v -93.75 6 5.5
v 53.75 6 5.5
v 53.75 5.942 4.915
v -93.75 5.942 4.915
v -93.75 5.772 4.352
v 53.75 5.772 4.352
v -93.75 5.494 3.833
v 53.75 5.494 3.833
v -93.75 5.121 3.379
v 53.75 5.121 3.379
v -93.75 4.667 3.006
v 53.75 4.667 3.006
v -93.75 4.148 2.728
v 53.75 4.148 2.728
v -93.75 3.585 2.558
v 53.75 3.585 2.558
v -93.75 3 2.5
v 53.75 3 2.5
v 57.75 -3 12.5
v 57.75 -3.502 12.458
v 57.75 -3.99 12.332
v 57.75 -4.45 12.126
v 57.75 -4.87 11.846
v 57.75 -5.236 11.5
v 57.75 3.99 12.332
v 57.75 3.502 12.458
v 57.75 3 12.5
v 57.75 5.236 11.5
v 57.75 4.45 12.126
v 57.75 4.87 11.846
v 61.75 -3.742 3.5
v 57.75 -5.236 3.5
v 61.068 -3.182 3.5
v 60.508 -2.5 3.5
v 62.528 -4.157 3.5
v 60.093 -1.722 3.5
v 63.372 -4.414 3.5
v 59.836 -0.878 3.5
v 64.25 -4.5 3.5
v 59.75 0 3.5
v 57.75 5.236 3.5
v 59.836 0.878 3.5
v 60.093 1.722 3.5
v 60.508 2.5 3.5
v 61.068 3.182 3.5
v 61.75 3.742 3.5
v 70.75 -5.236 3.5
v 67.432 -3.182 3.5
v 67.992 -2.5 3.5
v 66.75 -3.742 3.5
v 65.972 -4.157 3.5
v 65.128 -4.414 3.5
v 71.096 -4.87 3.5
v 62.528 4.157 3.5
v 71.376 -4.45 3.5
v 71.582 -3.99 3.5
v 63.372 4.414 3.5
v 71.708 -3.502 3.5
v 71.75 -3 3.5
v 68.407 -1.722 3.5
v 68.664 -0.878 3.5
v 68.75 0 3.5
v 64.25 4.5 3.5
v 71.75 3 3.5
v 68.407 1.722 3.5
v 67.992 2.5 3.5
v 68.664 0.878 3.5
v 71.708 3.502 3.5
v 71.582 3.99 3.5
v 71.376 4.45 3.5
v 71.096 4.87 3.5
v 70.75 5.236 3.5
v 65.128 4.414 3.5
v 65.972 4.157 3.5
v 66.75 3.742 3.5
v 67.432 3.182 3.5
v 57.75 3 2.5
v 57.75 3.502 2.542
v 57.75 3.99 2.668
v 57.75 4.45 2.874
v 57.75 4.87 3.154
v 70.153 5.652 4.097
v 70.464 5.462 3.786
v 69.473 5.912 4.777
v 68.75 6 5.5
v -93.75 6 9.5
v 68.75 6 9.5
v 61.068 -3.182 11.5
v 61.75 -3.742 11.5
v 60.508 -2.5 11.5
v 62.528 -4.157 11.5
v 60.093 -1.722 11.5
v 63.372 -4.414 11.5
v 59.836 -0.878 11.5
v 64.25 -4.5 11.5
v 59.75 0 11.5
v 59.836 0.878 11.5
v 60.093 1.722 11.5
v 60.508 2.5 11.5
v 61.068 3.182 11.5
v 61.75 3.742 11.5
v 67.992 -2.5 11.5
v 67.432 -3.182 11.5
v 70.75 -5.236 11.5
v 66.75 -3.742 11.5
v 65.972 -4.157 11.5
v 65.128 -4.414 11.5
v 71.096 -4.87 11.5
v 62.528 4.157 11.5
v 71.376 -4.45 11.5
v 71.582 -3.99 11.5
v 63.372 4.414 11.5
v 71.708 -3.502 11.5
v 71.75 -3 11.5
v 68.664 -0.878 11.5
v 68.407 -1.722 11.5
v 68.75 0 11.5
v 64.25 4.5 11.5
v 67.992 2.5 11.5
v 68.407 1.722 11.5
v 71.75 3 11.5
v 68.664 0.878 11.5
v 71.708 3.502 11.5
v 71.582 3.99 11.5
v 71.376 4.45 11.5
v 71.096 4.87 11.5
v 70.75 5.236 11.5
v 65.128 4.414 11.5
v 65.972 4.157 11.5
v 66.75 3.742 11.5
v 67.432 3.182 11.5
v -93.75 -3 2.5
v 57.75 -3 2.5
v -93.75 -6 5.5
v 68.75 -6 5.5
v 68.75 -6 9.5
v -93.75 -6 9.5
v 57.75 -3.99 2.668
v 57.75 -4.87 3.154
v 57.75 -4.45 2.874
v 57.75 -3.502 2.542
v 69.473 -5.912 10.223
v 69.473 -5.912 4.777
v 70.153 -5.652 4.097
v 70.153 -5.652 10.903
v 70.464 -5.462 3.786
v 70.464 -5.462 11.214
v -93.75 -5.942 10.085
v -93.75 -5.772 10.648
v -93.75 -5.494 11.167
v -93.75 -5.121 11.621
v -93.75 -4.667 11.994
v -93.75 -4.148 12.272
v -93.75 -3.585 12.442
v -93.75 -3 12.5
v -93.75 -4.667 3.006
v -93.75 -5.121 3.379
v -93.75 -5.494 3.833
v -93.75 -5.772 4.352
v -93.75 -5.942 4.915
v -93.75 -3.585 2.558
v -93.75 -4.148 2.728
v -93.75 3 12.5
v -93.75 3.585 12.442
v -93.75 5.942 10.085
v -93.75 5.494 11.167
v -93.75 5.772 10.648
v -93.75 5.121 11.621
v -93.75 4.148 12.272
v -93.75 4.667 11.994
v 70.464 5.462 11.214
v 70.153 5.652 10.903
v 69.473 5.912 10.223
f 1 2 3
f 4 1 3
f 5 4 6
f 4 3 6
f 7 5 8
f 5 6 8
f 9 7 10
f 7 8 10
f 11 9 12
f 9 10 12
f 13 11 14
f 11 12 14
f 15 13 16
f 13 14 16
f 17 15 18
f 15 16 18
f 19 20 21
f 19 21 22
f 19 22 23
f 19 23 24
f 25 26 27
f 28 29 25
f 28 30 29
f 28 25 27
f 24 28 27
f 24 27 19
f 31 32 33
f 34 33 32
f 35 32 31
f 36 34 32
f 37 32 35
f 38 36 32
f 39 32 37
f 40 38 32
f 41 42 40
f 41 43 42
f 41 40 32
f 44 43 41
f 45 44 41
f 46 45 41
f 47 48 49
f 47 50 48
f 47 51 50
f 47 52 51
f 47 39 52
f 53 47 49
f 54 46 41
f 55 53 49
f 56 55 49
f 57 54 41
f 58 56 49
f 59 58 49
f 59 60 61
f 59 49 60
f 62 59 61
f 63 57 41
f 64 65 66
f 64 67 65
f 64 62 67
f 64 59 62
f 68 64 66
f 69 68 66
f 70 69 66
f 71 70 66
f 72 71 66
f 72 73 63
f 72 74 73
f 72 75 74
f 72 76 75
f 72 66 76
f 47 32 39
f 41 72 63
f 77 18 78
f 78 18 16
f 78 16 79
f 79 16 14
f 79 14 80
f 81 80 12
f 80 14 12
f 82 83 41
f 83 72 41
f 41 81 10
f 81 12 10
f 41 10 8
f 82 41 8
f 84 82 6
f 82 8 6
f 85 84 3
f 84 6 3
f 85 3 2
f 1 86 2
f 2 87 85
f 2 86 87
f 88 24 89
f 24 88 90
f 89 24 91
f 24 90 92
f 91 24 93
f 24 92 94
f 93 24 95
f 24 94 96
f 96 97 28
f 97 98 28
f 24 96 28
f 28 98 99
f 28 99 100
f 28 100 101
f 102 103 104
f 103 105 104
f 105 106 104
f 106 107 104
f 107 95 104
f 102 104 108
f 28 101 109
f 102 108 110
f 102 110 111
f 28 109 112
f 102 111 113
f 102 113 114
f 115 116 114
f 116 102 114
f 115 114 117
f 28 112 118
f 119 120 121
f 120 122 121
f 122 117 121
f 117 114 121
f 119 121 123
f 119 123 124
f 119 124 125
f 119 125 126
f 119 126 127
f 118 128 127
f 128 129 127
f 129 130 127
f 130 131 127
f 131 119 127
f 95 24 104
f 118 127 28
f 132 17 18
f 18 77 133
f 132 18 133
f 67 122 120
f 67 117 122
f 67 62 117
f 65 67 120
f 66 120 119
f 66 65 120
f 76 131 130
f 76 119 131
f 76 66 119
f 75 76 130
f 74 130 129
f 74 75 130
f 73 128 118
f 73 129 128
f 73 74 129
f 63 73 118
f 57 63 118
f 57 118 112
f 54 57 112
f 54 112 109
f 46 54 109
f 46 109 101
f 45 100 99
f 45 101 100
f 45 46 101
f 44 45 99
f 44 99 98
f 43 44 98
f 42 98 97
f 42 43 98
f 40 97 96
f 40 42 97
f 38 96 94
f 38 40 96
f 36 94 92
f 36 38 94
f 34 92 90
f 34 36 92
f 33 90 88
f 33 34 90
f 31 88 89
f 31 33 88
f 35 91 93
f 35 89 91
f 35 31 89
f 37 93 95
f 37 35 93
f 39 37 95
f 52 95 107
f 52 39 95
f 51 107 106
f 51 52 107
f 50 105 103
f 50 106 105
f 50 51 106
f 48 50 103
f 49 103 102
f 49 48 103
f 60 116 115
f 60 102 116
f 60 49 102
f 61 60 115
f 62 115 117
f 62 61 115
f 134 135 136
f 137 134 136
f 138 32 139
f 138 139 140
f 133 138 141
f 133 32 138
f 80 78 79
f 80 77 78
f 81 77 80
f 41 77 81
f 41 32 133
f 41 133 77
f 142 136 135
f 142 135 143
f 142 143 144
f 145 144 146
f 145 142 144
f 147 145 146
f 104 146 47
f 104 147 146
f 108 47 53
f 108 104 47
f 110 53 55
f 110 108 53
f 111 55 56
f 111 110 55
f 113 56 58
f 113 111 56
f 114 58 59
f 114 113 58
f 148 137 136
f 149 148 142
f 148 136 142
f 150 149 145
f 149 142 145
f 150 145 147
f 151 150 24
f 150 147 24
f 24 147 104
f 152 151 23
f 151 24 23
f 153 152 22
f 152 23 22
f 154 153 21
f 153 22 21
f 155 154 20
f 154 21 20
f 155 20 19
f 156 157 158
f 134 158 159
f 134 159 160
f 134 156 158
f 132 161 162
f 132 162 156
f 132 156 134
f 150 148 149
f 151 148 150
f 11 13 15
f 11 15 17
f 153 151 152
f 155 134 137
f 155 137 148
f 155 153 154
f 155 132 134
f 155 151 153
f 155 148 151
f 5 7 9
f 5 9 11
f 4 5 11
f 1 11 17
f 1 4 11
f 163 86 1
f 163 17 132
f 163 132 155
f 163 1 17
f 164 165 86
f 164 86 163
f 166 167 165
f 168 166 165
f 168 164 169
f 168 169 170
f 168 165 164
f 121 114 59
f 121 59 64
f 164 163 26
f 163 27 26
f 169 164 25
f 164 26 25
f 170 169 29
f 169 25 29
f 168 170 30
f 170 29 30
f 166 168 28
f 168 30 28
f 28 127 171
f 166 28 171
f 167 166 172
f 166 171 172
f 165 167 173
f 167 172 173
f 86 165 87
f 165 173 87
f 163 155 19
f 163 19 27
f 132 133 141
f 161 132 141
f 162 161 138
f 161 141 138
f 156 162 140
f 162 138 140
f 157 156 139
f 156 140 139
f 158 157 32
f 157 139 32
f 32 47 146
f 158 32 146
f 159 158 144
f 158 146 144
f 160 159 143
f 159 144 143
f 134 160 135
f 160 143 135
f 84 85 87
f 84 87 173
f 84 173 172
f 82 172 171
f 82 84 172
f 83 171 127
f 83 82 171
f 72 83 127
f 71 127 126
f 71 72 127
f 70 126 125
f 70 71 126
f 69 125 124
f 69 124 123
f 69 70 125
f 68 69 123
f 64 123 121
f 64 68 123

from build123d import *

# Parameters (mm, degrees)
CROQUIS1_W                 = 37.5
CROQUIS1_H                 = 30
SALIENTE_EXTRUIR1_DEPTH    = 15
CROQUIS2_R                 = 2.1
SALIENTE_EXTRUIR2_DEPTH    = 1
SALIENTE_EXTRUIR3_DEPTH    = 35
CROQUIS5_W                 = 18
CROQUIS5_H                 = 12
CROQUIS5_R                 = 4.5
SALIENTE_EXTRUIR4_DEPTH    = 5
CROQUIS6_W                 = 1
CROQUIS6_H                 = 12
CORTAR_EXTRUIR2_DEPTH      = 14
REDONDEO1_R                = 3
REDONDEO2_R                = 3
CORTAR_EXTRUIR3_DEPTH      = 78.447159406
CORTAR_EXTRUIR3_DEPTH_BACK = 78.447159406
CROQUIS7_OUTSIDE_W         = 123.972
CROQUIS7_OUTSIDE_H         = 74.472
CROQUIS7_OUTSIDE_W_2       = 24.163279834
CROQUIS7_OUTSIDE_H_2       = 36.211204922
SALIENTE_EXTRUIR5_DEPTH    = 147.5


with BuildPart() as part:
    # Croquis1 → Saliente-Extruir1 (new body)
    with BuildSketch(Plane.XY):
        Rectangle(CROQUIS1_W, CROQUIS1_H)
    extrude(amount=SALIENTE_EXTRUIR1_DEPTH)

    # Croquis2 → Saliente-Extruir2 (add)
    # profile 1 of 3: a face of its own
    with BuildSketch(Plane.XY):
        with BuildLine():
            Line((-18.75, 3.7), (-26.75, 3.7))
            ThreePointArc((-26.75, 3.7), (-27.457106781, 3.407106781), (-27.75, 2.7))
            Line((-27.75, 2.7), (-27.75, -2.7))
            ThreePointArc((-27.75, -2.7), (-27.457106781, -3.407106781), (-26.75, -3.7))
            Line((-26.75, -3.7), (-18.75, -3.7))
            Line((-18.75, -3.7), (-18.75, 3.7))
        make_face()
        with Locations((-23.25, 0)):
            Circle(CROQUIS2_R, mode=Mode.SUBTRACT)
    # profile 2 of 3: a face of its own
    with BuildSketch(Plane.XY):
        with BuildLine():
            Line((-10, 15), (10, 15))
            Line((10, 15), (10, 24))
            ThreePointArc((10, 24), (9.707106781, 24.707106781), (9, 25))
            Line((9, 25), (-9, 25))
            ThreePointArc((-9, 25), (-9.707106781, 24.707106781), (-10, 24))
            Line((-10, 24), (-10, 15))
        make_face()
        with Locations((-5.5, 20)):
            Circle(CROQUIS2_R, mode=Mode.SUBTRACT)
        with Locations((5.5, 20)):
            Circle(CROQUIS2_R, mode=Mode.SUBTRACT)
    # profile 3 of 3: a face of its own
    with BuildSketch(Plane.XY):
        with BuildLine():
            Line((-9, -25), (9, -25))
            ThreePointArc((9, -25), (9.707106781, -24.707106781), (10, -24))
            Line((10, -24), (10, -15))
            Line((10, -15), (-10, -15))
            Line((-10, -15), (-10, -24))
            ThreePointArc((-10, -24), (-9.707106781, -24.707106781), (-9, -25))
        make_face()
        with Locations(Location((5.5, -20, 0), (0, 0, 180))):
            Circle(CROQUIS2_R, mode=Mode.SUBTRACT)
        with Locations(Location((-5.5, -20, 0), (0, 0, 180))):
            Circle(CROQUIS2_R, mode=Mode.SUBTRACT)
    extrude(amount=SALIENTE_EXTRUIR2_DEPTH)

    # Croquis3 → Saliente-Extruir3 (add)
    with BuildSketch(Plane(origin=(18.75, 0, 0), x_dir=(0, 0, -1), z_dir=(1, 0, 0))):
        with BuildLine():
            Line((-10.5, -12.5), (-4.5, -12.5))
            ThreePointArc((-4.5, -12.5), (-2.378679656, -11.621320344), (-1.5, -9.5))
            Line((-1.5, -9.5), (-1.5, 9.5))
            ThreePointArc((-1.5, 9.5), (-2.378679656, 11.621320344), (-4.5, 12.5))
            Line((-4.5, 12.5), (-10.5, 12.5))
            ThreePointArc((-10.5, 12.5), (-12.621320344, 11.621320344), (-13.5, 9.5))
            Line((-13.5, 9.5), (-13.5, -9.5))
            ThreePointArc((-13.5, -9.5), (-12.621320344, -11.621320344), (-10.5, -12.5))
        make_face()
    extrude(amount=SALIENTE_EXTRUIR3_DEPTH)

    # Croquis5 → Saliente-Extruir4 (add, symmetric)
    with BuildSketch(Plane.XY.offset(7.5)):
        with Locations((62.75, 0)):
            Rectangle(CROQUIS5_W, CROQUIS5_H)
        with Locations((64.25, 0)):
            Circle(CROQUIS5_R, mode=Mode.SUBTRACT)
    extrude(amount=SALIENTE_EXTRUIR4_DEPTH, both=True)

    # Croquis6 → Cortar-Extruir2 (cut)
    with BuildSketch(Plane(origin=(71.75, 0, 0), x_dir=(0, 0, -1), z_dir=(1, 0, 0))):
        with Locations((-12, 0)):
            Rectangle(CROQUIS6_W, CROQUIS6_H)
        with Locations((-3, 0)):
            Rectangle(CROQUIS6_W, CROQUIS6_H)
    extrude(amount=-CORTAR_EXTRUIR2_DEPTH, mode=Mode.SUBTRACT)

    # Redondeo1
    redondeo1_edges = [part.edges().sort_by_distance(p)[0] for p in [
        (71.75, 6, 7.5),
        (71.75, -6, 7.5),
    ]]
    fillet(redondeo1_edges, radius=REDONDEO1_R)

    # Redondeo2
    # the kernel refuses this fillet: 3 mm, written as the material it takes off along each edge
    with BuildSketch(Plane(origin=(75.75, -6, 12.5), x_dir=(0, 1, 0), z_dir=(-1, 0, 0)), Plane(origin=(53.75, 6, 2.5), x_dir=(0, 0, 1), z_dir=(1, 0, 0))) as redondeo2_piece_1:
        with BuildLine():
            CenterArc((REDONDEO2_R, REDONDEO2_R), REDONDEO2_R, 180, 90)
            Line((0, REDONDEO2_R), (-REDONDEO2_R * 0.02, REDONDEO2_R))
            Line((-REDONDEO2_R * 0.02, REDONDEO2_R), (-REDONDEO2_R * 0.02, -REDONDEO2_R * 0.02))
            Line((-REDONDEO2_R * 0.02, -REDONDEO2_R * 0.02), (REDONDEO2_R, -REDONDEO2_R * 0.02))
            Line((REDONDEO2_R, -REDONDEO2_R * 0.02), (REDONDEO2_R, 0))
        make_face()
    extrude(amount=22, mode=Mode.SUBTRACT)
    with BuildSketch(Plane(origin=(75.75, -6, 2.5), x_dir=(0, 1, 0), z_dir=(-1, 0, 0)), Plane(origin=(53.75, 6, 12.5), x_dir=(0, 0, -1), z_dir=(1, 0, 0))) as redondeo2_piece_2:
        with BuildLine():
            CenterArc((REDONDEO2_R, -REDONDEO2_R), REDONDEO2_R, 90, 90)
            Line((0, -REDONDEO2_R), (-REDONDEO2_R * 0.02, -REDONDEO2_R))
            Line((-REDONDEO2_R * 0.02, -REDONDEO2_R), (-REDONDEO2_R * 0.02, REDONDEO2_R * 0.02))
            Line((-REDONDEO2_R * 0.02, REDONDEO2_R * 0.02), (REDONDEO2_R, REDONDEO2_R * 0.02))
            Line((REDONDEO2_R, REDONDEO2_R * 0.02), (REDONDEO2_R, 0))
        make_face()
    extrude(amount=22, mode=Mode.SUBTRACT)

    # Croquis7 outside → Cortar-Extruir3 (cut, two sides: drawn at the far end of the back side and taken through both)
    with BuildSketch(Plane.XY.offset(15).offset(-CORTAR_EXTRUIR3_DEPTH_BACK)):
        with Locations((22, 0)):
            Rectangle(CROQUIS7_OUTSIDE_W, CROQUIS7_OUTSIDE_H)
        with Locations((65.831639917, -3.105602461)):
            Rectangle(CROQUIS7_OUTSIDE_W_2, CROQUIS7_OUTSIDE_H_2, mode=Mode.SUBTRACT)
    extrude(amount=CORTAR_EXTRUIR3_DEPTH + CORTAR_EXTRUIR3_DEPTH_BACK, mode=Mode.SUBTRACT)

    # Croquis10 → Saliente-Extruir5 (add)
    with BuildSketch(Plane.ZY.offset(-53.75)):
        with BuildLine():
            Line((5.5, -6), (9.5, -6))
            ThreePointArc((9.5, -6), (11.621320344, -5.121320344), (12.5, -3))
            Line((12.5, -3), (12.5, 3))
            ThreePointArc((12.5, 3), (11.621320344, 5.121320344), (9.5, 6))
            Line((9.5, 6), (5.5, 6))
            ThreePointArc((5.5, 6), (3.378679656, 5.121320344), (2.5, 3))
            Line((2.5, 3), (2.5, -3))
            ThreePointArc((2.5, -3), (3.378679656, -5.121320344), (5.5, -6))
        make_face()
    extrude(amount=SALIENTE_EXTRUIR5_DEPTH)


solid = part.part
